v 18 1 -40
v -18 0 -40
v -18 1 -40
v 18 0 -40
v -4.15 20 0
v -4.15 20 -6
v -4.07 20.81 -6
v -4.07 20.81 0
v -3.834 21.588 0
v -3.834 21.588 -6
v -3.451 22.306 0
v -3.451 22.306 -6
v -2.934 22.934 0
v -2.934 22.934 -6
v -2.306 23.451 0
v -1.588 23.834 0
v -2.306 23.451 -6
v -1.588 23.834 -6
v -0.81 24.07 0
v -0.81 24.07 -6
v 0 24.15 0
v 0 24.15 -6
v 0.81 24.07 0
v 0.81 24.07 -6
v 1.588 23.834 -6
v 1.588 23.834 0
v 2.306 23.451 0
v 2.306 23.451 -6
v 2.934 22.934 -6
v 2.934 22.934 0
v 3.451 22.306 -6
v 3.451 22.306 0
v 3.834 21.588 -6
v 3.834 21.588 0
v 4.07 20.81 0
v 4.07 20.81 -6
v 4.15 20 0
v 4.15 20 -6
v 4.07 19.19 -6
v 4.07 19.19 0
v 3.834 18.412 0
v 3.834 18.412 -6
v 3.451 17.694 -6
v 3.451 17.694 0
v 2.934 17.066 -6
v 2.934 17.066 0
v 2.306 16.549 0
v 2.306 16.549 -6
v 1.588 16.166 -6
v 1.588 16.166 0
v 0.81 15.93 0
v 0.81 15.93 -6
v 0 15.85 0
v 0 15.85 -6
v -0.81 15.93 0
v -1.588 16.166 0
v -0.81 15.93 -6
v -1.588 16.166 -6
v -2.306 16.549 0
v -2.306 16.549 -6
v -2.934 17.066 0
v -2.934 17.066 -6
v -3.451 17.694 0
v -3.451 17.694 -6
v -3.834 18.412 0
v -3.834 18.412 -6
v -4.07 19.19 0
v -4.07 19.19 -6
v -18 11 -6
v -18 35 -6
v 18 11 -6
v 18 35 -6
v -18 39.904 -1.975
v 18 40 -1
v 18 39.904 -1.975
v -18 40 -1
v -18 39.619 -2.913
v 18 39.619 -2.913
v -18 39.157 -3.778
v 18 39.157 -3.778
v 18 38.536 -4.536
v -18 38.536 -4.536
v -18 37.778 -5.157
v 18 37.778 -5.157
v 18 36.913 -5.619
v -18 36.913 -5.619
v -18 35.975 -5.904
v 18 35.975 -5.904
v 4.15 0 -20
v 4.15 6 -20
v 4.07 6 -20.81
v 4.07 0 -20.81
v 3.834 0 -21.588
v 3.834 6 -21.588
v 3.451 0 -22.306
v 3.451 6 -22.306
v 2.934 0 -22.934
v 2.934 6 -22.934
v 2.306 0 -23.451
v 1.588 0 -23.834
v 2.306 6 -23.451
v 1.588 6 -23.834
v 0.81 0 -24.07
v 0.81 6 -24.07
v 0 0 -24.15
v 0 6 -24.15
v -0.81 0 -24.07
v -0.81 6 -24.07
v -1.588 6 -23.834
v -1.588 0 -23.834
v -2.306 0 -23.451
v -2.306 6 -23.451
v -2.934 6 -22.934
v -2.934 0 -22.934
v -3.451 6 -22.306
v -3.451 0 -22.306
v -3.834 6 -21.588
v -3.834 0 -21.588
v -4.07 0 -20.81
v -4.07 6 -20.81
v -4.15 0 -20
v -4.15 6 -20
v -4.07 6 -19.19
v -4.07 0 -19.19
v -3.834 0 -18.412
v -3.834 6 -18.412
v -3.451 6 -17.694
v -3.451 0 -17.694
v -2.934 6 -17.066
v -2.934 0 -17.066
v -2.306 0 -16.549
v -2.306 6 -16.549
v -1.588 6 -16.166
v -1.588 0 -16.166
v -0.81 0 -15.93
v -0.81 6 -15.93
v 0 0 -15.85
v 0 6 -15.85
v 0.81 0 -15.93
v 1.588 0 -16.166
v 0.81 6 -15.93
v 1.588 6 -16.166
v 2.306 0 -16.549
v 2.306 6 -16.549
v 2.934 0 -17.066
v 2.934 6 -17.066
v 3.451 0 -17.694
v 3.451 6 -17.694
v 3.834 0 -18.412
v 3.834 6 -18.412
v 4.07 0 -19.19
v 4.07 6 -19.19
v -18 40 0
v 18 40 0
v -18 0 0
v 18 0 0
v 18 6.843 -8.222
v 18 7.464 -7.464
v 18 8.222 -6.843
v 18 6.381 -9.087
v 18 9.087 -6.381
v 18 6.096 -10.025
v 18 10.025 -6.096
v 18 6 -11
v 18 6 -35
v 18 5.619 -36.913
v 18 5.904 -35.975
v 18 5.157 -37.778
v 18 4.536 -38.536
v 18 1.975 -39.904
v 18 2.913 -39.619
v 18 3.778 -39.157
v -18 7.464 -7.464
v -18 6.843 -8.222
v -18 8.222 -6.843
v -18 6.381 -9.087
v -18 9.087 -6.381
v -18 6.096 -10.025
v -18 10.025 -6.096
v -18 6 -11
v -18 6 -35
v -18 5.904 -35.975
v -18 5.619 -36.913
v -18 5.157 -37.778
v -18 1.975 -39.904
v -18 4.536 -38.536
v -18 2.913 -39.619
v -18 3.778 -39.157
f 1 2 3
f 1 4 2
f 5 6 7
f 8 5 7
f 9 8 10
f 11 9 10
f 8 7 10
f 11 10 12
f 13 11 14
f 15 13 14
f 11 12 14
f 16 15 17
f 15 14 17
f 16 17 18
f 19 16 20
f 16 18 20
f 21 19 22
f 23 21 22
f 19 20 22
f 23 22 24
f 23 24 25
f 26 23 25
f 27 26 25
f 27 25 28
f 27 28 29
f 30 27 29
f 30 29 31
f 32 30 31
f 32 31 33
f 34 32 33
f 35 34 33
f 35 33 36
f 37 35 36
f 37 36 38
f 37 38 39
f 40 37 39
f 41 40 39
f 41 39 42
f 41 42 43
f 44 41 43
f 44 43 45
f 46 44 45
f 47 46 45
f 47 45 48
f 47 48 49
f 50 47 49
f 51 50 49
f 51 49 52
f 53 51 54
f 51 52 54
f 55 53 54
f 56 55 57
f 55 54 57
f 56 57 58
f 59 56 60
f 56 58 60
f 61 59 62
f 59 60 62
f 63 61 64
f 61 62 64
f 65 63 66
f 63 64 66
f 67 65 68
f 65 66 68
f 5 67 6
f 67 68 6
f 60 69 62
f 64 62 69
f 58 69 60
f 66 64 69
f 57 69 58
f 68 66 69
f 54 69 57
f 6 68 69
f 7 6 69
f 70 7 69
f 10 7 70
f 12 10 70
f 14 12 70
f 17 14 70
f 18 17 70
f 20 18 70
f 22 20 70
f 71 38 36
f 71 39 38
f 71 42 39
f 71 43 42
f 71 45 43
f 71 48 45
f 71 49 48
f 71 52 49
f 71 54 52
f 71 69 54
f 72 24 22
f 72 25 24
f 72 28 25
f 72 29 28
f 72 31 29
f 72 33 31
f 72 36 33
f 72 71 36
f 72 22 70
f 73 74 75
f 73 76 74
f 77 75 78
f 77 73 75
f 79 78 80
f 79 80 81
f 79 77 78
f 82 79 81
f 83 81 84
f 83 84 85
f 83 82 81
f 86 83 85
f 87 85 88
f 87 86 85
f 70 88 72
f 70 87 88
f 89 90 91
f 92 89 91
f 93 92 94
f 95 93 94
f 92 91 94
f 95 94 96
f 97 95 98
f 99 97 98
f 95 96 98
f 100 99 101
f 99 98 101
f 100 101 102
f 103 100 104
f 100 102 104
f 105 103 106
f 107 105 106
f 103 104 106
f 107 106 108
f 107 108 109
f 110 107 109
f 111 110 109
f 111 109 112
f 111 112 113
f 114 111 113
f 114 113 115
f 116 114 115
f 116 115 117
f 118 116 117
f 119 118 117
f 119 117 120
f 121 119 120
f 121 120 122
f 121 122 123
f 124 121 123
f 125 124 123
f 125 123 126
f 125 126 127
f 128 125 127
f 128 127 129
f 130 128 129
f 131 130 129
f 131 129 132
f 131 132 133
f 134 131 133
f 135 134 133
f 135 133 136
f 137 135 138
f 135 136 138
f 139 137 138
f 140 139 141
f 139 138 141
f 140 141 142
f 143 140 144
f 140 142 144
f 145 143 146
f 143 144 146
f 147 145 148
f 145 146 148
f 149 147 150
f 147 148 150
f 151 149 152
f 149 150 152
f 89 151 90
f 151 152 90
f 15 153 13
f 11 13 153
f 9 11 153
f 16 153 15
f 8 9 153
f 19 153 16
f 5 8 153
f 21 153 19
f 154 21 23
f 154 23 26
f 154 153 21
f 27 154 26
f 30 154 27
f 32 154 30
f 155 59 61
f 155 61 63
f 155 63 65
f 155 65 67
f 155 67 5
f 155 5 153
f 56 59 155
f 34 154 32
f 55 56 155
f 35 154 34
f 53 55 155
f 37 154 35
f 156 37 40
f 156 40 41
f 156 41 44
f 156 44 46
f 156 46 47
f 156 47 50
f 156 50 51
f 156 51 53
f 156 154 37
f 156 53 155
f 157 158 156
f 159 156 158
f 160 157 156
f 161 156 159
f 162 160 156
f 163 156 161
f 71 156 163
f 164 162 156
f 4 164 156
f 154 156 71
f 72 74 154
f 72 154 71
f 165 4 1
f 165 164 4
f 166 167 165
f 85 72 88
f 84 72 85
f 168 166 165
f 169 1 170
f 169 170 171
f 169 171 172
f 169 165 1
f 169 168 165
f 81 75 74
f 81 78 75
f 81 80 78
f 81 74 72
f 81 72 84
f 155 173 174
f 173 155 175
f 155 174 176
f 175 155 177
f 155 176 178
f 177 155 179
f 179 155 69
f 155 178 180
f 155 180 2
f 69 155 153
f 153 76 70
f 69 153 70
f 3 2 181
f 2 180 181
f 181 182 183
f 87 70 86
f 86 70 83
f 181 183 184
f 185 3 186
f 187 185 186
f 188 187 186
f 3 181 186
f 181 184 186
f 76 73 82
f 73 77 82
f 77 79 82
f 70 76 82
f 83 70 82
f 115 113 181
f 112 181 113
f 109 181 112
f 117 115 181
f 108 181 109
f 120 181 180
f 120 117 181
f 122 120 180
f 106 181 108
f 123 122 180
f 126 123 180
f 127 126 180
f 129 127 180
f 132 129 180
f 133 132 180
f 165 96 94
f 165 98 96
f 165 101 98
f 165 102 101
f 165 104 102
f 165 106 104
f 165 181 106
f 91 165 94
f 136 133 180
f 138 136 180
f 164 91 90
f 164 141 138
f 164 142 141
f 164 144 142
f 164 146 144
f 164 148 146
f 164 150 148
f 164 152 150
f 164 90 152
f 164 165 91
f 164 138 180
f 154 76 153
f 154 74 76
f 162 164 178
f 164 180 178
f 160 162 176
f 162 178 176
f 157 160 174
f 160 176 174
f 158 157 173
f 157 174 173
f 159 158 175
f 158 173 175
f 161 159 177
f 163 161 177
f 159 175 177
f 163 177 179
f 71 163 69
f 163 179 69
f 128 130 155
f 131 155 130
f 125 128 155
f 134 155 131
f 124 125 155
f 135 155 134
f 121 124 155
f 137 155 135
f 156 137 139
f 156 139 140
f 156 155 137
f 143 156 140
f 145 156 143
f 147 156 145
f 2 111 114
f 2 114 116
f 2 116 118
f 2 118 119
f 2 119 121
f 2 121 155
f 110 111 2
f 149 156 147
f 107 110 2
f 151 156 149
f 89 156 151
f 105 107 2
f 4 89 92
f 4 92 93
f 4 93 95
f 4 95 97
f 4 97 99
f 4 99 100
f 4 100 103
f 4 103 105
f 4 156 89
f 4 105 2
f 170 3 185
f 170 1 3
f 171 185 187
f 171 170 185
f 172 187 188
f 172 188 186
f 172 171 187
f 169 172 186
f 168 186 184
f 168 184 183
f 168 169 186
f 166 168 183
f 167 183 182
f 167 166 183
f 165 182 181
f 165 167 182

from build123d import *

# Parameters (mm, degrees)
BOSS_EXTRUDE1_DEPTH = 18
SKETCH2_R           = 4.15
CUT_EXTRUDE1_DEPTH  = 7
SKETCH3_R           = 4.15
CUT_EXTRUDE2_DEPTH  = 7
FILLET1_R           = 5


with BuildPart() as part:
    # Sketch1 → Boss-Extrude1 (new body, symmetric)
    with BuildSketch(Plane(origin=(0, 0, 0), x_dir=(0, 0, -1), z_dir=(1, 0, 0))):
        Polygon((0, 40), (0, 0), (40, 0), (40, 6), (6, 6), (6, 40), align=None)
    extrude(amount=BOSS_EXTRUDE1_DEPTH, both=True)

    # Sketch2 → Cut-Extrude1 (cut, through all)
    with BuildSketch(Plane(origin=(0, 6, 0), x_dir=(1, 0, 0), z_dir=(0, 1, 0))):
        with Locations((0, 20)):
            Circle(SKETCH2_R)
    extrude(amount=-CUT_EXTRUDE1_DEPTH, mode=Mode.SUBTRACT)

    # Sketch3 → Cut-Extrude2 (cut, through all)
    with BuildSketch(Plane(origin=(0, 0, -6), x_dir=(-1, 0, 0), z_dir=(0, 0, -1))):
        with Locations((0, 20)):
            Circle(SKETCH3_R)
    extrude(amount=-CUT_EXTRUDE2_DEPTH, mode=Mode.SUBTRACT)

    # Fillet1
    fillet1_edges = [part.edges().sort_by_distance(p)[0] for p in [
        (0, 40, -6),
        (0, 6, -6),
        (0, 6, -40),
    ]]
    fillet(fillet1_edges, radius=FILLET1_R)


solid = part.part
